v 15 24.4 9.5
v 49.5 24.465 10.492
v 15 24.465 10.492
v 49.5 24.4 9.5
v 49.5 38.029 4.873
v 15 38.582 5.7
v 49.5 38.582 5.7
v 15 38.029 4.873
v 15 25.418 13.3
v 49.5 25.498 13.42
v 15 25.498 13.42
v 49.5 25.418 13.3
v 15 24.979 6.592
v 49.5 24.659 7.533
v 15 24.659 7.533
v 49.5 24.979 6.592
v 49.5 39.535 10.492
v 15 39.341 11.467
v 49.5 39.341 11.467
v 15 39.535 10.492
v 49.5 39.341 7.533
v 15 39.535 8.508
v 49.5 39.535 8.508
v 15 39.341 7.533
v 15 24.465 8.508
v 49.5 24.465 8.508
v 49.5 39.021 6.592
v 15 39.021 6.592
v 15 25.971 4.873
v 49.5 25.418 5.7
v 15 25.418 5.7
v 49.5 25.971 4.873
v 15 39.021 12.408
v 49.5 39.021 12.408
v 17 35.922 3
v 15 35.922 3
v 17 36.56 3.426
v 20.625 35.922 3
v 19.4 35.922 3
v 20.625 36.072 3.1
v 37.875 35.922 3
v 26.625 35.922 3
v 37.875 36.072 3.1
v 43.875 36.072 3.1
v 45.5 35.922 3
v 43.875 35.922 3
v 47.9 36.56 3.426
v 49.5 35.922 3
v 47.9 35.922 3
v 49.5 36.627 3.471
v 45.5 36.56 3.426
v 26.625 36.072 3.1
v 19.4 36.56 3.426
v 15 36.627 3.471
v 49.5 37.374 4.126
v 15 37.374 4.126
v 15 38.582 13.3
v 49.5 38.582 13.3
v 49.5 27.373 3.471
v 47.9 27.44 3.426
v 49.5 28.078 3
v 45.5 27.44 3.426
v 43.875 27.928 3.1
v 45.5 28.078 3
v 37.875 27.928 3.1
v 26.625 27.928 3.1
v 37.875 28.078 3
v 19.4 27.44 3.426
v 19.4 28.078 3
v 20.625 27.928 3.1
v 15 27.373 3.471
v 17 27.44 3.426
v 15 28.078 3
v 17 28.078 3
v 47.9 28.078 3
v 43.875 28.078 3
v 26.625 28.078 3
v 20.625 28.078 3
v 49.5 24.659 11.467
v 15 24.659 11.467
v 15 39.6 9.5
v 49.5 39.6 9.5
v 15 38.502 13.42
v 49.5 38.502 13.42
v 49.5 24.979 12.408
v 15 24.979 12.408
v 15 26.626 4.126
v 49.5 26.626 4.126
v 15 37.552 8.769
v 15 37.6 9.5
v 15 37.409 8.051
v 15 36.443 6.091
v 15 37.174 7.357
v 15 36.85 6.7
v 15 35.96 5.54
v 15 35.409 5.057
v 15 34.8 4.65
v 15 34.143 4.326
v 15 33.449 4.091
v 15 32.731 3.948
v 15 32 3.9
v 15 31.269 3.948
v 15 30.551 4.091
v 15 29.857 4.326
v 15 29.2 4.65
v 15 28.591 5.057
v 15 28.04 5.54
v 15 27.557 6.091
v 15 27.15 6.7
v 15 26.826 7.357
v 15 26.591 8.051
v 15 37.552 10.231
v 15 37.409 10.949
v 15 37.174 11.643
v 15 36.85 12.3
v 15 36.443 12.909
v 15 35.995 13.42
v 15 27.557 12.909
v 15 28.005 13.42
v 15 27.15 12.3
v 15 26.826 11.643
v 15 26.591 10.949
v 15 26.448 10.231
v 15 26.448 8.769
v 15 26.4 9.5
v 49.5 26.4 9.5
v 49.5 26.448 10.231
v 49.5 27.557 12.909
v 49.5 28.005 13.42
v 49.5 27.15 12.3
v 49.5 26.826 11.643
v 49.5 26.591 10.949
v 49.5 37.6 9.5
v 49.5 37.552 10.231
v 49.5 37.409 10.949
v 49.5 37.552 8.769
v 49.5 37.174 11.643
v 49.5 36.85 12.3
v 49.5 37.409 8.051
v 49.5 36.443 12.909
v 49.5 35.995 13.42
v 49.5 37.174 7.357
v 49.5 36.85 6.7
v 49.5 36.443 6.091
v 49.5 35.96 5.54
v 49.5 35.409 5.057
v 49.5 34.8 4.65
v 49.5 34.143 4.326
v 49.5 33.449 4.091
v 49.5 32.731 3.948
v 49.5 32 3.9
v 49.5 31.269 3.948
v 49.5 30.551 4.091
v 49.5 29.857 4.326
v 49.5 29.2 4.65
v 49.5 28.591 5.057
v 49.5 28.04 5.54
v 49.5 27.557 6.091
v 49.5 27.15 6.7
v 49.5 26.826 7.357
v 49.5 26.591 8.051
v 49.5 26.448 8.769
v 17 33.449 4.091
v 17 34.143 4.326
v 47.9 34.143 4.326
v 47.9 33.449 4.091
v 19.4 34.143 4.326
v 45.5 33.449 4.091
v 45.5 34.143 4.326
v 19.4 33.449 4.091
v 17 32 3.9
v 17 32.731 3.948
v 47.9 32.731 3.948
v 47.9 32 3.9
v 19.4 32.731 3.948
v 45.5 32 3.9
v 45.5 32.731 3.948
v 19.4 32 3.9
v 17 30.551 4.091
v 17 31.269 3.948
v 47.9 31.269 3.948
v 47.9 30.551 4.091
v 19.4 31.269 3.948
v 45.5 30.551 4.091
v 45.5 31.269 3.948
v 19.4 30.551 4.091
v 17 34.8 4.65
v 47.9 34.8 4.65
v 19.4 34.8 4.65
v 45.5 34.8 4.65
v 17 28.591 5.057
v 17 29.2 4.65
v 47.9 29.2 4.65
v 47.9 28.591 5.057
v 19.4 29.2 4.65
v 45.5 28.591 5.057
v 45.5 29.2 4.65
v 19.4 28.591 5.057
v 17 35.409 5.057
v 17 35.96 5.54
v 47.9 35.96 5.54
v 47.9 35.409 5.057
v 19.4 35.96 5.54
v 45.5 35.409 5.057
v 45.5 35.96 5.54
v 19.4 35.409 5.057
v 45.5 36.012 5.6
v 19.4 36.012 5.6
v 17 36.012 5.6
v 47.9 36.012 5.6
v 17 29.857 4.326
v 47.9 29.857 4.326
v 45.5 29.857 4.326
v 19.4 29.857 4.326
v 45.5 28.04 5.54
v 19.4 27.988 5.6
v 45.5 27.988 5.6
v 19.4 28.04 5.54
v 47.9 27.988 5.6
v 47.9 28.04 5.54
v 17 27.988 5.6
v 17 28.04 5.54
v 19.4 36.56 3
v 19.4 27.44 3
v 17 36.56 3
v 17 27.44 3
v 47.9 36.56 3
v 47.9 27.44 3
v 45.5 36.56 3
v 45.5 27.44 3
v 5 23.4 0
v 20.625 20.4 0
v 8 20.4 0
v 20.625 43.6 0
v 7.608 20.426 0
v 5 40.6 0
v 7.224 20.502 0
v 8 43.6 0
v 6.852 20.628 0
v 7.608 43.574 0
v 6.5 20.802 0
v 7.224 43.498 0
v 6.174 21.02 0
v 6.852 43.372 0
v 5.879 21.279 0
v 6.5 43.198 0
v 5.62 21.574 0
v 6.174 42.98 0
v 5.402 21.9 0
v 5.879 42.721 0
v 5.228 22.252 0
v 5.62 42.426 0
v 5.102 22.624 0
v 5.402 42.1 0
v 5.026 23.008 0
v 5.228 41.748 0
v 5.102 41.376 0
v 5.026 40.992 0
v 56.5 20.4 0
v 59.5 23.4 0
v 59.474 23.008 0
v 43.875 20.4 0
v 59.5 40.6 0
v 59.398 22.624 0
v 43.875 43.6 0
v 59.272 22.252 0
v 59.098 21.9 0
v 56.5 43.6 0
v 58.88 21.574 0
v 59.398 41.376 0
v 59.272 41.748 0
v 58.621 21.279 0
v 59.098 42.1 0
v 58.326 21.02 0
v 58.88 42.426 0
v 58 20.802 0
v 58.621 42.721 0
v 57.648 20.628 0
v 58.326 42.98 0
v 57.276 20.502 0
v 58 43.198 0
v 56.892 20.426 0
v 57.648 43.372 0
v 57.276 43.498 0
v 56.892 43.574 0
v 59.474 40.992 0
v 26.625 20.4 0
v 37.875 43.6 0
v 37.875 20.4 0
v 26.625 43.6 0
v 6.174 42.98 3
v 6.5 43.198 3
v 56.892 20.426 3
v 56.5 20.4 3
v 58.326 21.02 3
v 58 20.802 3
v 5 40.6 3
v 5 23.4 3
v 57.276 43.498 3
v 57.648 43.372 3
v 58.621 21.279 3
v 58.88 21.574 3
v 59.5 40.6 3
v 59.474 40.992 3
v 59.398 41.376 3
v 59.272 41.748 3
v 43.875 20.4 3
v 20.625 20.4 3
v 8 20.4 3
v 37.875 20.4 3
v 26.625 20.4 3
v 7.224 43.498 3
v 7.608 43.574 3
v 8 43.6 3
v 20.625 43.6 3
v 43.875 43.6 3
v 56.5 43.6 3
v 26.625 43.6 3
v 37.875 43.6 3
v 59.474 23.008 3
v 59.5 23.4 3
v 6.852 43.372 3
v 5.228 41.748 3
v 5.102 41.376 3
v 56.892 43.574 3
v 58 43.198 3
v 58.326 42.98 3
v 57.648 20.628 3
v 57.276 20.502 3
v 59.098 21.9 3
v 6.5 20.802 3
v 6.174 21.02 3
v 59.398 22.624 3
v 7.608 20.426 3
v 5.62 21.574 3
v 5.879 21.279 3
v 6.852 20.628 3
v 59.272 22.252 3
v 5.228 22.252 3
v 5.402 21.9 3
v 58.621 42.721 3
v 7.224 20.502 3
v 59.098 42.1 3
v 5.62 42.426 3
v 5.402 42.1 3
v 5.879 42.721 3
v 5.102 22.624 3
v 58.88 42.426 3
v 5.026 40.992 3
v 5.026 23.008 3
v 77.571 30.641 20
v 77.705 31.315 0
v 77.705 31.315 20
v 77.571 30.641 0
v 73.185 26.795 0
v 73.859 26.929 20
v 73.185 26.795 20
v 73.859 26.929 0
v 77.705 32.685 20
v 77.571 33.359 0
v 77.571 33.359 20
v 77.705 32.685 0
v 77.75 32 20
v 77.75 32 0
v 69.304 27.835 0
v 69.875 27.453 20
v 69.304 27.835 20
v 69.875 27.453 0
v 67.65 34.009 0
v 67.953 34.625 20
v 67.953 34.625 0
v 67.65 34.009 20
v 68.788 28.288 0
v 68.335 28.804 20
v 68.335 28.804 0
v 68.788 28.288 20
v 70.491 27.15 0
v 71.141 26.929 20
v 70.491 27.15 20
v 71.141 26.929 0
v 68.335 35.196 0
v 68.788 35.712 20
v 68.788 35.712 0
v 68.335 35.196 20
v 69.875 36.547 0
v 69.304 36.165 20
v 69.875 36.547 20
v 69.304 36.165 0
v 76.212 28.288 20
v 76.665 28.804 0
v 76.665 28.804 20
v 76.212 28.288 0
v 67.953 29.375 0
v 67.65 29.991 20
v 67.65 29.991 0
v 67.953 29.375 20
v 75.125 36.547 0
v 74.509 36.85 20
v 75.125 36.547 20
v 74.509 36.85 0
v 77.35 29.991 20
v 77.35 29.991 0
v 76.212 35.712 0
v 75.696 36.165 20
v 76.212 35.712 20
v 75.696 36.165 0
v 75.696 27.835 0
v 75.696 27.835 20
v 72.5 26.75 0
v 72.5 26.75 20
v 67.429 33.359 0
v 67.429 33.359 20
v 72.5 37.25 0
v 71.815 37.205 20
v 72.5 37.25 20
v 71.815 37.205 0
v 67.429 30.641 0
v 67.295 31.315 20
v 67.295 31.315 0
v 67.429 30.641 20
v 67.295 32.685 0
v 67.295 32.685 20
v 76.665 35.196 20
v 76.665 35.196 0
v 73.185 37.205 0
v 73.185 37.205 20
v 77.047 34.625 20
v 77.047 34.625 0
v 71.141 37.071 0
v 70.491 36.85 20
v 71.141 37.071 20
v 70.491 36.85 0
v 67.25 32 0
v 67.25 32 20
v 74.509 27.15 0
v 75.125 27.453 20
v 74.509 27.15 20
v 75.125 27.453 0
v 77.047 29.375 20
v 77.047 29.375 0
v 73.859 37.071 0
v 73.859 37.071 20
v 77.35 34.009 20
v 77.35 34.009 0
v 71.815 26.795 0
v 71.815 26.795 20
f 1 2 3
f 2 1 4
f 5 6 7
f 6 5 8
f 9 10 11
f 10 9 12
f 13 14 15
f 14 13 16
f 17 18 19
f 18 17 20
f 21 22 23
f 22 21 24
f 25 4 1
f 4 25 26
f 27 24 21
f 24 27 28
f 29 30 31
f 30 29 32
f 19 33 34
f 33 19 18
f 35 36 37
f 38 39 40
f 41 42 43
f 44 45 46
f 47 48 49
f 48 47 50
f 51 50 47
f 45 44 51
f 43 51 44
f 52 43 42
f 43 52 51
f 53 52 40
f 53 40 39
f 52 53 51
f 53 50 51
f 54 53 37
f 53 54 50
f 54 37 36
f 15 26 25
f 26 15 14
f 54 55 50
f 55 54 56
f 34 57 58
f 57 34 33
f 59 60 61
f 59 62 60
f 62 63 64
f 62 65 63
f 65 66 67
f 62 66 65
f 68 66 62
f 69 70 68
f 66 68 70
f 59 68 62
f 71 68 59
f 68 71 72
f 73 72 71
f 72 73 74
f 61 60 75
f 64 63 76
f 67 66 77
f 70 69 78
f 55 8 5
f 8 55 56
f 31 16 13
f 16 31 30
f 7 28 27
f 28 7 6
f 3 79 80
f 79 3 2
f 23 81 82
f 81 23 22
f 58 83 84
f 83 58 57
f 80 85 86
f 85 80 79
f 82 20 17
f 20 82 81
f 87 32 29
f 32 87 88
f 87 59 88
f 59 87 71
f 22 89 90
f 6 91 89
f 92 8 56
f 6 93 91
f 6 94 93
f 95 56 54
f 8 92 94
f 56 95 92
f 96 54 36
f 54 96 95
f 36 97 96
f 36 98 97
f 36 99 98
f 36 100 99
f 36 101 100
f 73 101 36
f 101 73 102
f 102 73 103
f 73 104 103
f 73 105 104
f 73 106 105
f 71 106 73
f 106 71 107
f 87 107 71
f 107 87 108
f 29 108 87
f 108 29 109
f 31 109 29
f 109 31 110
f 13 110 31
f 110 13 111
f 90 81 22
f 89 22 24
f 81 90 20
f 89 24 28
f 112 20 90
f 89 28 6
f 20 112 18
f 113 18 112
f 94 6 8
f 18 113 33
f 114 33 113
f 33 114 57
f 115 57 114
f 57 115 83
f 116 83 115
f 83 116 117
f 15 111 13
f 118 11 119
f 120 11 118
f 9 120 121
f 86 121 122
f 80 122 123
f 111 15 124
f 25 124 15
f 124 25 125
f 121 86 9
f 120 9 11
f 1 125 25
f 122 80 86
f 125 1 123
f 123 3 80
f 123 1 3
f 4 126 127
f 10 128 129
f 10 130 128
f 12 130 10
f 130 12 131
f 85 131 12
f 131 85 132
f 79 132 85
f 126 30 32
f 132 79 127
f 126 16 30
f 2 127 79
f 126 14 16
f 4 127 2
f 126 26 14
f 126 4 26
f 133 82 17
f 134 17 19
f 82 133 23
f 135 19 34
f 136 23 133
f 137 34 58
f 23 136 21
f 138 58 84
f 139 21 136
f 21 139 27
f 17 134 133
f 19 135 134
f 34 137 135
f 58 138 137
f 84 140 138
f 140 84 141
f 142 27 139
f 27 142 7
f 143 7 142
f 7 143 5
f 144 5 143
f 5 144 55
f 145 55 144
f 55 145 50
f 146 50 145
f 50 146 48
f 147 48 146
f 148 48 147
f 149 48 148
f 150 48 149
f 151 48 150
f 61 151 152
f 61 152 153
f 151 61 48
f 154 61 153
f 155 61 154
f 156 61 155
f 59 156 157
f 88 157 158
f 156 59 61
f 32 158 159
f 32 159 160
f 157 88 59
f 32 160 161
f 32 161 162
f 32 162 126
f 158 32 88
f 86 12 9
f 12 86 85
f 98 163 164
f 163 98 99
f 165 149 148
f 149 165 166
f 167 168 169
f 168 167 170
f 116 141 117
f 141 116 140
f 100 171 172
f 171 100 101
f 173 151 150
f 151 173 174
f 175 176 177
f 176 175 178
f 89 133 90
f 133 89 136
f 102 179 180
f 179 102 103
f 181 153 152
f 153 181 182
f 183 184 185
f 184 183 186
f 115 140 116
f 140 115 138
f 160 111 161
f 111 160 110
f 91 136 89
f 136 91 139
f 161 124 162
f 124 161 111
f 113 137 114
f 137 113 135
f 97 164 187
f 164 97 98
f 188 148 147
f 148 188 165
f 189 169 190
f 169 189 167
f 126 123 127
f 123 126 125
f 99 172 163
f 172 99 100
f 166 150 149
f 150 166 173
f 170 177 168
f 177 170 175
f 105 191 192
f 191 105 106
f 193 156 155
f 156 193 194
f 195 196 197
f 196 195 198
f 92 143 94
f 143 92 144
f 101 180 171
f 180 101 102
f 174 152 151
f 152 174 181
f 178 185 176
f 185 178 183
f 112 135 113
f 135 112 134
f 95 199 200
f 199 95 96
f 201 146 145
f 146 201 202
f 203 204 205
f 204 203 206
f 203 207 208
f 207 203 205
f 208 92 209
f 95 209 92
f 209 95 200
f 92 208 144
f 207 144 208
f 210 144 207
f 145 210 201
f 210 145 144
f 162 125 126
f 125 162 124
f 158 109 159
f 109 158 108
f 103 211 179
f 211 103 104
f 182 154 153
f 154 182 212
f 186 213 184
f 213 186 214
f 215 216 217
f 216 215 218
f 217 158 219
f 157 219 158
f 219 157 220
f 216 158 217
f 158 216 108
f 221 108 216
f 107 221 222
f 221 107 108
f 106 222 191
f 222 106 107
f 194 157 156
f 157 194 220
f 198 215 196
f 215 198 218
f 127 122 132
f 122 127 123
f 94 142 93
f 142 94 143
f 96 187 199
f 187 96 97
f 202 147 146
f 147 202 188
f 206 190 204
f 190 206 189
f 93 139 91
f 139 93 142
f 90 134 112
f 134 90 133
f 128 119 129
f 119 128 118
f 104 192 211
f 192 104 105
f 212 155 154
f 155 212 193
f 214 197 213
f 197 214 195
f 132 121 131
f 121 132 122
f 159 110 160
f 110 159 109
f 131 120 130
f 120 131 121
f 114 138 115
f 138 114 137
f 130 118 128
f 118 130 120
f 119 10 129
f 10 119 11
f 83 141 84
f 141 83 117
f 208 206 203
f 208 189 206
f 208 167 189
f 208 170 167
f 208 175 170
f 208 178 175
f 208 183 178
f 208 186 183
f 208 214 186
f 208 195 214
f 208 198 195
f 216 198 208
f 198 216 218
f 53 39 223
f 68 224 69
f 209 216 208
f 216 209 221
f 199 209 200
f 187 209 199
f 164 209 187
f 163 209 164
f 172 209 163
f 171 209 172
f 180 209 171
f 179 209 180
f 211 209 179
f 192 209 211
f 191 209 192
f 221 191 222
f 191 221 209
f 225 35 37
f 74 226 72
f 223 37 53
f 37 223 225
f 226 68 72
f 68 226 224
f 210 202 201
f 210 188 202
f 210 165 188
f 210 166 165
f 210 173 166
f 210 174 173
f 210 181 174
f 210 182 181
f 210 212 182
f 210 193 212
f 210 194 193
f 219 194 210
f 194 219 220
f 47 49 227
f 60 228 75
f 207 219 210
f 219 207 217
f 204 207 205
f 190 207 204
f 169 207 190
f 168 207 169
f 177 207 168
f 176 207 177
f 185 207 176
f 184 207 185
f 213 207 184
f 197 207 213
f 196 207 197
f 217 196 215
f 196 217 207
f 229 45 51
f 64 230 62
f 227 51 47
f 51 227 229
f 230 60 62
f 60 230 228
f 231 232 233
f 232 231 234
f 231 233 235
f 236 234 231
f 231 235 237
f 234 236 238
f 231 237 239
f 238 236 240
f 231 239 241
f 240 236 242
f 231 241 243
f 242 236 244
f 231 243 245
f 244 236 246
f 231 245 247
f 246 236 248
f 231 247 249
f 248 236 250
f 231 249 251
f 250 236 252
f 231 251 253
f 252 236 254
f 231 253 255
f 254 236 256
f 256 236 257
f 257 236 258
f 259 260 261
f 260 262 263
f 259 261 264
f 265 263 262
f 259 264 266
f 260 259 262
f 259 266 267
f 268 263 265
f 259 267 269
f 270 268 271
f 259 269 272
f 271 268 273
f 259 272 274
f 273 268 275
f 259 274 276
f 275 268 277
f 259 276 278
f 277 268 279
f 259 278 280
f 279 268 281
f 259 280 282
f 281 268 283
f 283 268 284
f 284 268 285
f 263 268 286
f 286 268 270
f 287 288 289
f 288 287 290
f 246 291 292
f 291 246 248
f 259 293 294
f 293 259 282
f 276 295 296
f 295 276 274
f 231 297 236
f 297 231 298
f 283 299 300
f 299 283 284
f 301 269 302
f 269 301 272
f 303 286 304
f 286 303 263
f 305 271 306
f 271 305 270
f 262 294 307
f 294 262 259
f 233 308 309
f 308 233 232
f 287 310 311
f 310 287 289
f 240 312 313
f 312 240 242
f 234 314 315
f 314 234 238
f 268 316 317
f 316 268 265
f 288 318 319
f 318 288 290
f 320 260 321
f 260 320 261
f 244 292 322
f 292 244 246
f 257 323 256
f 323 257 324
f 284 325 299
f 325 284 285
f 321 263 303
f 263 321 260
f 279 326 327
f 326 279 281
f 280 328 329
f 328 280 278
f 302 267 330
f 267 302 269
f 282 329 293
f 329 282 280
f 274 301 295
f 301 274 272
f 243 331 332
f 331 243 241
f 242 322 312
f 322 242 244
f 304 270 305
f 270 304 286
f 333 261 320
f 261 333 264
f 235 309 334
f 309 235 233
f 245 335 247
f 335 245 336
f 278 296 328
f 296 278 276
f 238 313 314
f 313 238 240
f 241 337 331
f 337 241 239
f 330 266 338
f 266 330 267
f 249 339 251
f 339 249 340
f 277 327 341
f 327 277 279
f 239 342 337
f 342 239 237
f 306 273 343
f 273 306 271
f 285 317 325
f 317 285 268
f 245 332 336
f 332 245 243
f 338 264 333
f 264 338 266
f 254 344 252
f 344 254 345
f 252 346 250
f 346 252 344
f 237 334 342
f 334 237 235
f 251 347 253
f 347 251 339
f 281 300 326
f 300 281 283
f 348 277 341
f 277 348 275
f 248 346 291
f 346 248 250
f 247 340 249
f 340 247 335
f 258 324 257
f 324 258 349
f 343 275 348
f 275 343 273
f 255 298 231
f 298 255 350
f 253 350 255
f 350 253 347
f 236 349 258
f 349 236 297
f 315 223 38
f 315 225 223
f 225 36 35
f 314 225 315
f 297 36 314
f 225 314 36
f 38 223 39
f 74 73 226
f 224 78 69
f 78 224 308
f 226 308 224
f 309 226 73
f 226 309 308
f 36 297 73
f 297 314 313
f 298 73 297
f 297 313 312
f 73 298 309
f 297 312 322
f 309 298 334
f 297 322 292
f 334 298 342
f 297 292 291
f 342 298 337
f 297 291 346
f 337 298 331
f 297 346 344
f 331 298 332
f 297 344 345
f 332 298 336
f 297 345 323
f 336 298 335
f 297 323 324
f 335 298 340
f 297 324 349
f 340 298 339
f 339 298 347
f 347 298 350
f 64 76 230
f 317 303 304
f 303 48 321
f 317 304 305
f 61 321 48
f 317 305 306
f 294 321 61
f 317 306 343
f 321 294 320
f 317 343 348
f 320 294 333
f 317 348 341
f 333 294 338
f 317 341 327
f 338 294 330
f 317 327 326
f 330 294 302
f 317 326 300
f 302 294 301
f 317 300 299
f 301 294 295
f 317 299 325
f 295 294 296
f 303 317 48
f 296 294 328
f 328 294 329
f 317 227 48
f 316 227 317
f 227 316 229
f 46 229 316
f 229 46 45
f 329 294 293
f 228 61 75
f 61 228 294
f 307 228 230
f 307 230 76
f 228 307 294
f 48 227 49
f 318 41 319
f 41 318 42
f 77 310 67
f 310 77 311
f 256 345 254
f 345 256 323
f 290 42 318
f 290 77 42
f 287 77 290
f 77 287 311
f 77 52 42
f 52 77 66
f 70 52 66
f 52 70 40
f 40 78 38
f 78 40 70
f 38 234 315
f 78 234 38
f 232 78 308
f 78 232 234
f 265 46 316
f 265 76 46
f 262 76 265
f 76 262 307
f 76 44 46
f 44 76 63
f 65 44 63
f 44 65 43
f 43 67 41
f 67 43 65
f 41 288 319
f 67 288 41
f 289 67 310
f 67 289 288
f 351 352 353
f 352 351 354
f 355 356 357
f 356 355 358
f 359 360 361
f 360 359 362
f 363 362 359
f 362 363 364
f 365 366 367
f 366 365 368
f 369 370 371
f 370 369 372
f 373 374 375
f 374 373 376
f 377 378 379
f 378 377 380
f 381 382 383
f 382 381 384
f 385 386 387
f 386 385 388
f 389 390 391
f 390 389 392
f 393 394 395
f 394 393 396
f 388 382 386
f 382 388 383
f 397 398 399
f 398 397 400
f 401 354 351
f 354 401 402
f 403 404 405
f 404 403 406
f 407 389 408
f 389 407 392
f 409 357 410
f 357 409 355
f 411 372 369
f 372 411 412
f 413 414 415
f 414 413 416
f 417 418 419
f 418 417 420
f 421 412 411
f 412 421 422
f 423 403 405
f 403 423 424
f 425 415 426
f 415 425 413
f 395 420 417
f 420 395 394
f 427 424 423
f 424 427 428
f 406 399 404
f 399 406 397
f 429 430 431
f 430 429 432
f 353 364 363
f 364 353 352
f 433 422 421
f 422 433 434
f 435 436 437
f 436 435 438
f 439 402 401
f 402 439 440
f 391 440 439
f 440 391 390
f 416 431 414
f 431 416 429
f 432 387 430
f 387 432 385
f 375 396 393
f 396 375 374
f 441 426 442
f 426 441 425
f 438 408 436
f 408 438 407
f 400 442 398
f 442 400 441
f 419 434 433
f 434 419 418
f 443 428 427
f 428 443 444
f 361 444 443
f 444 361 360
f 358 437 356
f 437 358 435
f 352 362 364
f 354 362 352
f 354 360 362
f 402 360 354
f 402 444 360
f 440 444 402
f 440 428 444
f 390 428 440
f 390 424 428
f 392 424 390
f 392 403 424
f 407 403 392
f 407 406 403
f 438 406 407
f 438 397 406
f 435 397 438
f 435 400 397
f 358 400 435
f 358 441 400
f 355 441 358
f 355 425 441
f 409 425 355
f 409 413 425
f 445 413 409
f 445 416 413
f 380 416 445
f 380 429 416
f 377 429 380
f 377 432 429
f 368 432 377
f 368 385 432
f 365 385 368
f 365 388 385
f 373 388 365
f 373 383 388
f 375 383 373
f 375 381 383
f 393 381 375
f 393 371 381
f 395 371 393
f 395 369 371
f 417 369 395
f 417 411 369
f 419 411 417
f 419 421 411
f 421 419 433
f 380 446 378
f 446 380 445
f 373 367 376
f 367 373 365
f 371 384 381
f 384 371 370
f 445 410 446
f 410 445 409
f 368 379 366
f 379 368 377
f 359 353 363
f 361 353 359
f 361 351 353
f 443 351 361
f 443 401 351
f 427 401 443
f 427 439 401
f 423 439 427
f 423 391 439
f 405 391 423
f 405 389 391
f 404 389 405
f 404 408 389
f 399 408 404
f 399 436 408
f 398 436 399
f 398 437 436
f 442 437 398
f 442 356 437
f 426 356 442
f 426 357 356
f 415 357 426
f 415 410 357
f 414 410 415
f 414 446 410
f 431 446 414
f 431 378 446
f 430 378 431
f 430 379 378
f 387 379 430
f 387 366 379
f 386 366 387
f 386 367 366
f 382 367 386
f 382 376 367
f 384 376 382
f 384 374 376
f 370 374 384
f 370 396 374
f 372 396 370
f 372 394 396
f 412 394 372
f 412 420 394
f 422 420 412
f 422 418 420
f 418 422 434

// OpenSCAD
/*
Sample 149: Zylindrischer Zellhalter — 1 x AAA
Generated from the FDM Mechanical Sample Library.
Units: millimetres.

Override examples:
  openscad -o custom.stl -D 'view="plate"' -D 'render_fn=64' model.scad
  openscad -o preview.png -D 'view="assembly"' model.scad
*/
use <../../../library/fdm_mechanisms.scad>

render_fn = is_undef(render_fn) ? 48 : render_fn;
view = is_undef(view) ? "plate" : view;
$fn = render_fn;

sample_cell_cradle(
    view=view,
    cell_d=10.5,
    cell_l=44.5,
    count=1,
    cell_gap=2,
    clearance=0.35,
    strap_w=6,
    contact_keepout=5
);
